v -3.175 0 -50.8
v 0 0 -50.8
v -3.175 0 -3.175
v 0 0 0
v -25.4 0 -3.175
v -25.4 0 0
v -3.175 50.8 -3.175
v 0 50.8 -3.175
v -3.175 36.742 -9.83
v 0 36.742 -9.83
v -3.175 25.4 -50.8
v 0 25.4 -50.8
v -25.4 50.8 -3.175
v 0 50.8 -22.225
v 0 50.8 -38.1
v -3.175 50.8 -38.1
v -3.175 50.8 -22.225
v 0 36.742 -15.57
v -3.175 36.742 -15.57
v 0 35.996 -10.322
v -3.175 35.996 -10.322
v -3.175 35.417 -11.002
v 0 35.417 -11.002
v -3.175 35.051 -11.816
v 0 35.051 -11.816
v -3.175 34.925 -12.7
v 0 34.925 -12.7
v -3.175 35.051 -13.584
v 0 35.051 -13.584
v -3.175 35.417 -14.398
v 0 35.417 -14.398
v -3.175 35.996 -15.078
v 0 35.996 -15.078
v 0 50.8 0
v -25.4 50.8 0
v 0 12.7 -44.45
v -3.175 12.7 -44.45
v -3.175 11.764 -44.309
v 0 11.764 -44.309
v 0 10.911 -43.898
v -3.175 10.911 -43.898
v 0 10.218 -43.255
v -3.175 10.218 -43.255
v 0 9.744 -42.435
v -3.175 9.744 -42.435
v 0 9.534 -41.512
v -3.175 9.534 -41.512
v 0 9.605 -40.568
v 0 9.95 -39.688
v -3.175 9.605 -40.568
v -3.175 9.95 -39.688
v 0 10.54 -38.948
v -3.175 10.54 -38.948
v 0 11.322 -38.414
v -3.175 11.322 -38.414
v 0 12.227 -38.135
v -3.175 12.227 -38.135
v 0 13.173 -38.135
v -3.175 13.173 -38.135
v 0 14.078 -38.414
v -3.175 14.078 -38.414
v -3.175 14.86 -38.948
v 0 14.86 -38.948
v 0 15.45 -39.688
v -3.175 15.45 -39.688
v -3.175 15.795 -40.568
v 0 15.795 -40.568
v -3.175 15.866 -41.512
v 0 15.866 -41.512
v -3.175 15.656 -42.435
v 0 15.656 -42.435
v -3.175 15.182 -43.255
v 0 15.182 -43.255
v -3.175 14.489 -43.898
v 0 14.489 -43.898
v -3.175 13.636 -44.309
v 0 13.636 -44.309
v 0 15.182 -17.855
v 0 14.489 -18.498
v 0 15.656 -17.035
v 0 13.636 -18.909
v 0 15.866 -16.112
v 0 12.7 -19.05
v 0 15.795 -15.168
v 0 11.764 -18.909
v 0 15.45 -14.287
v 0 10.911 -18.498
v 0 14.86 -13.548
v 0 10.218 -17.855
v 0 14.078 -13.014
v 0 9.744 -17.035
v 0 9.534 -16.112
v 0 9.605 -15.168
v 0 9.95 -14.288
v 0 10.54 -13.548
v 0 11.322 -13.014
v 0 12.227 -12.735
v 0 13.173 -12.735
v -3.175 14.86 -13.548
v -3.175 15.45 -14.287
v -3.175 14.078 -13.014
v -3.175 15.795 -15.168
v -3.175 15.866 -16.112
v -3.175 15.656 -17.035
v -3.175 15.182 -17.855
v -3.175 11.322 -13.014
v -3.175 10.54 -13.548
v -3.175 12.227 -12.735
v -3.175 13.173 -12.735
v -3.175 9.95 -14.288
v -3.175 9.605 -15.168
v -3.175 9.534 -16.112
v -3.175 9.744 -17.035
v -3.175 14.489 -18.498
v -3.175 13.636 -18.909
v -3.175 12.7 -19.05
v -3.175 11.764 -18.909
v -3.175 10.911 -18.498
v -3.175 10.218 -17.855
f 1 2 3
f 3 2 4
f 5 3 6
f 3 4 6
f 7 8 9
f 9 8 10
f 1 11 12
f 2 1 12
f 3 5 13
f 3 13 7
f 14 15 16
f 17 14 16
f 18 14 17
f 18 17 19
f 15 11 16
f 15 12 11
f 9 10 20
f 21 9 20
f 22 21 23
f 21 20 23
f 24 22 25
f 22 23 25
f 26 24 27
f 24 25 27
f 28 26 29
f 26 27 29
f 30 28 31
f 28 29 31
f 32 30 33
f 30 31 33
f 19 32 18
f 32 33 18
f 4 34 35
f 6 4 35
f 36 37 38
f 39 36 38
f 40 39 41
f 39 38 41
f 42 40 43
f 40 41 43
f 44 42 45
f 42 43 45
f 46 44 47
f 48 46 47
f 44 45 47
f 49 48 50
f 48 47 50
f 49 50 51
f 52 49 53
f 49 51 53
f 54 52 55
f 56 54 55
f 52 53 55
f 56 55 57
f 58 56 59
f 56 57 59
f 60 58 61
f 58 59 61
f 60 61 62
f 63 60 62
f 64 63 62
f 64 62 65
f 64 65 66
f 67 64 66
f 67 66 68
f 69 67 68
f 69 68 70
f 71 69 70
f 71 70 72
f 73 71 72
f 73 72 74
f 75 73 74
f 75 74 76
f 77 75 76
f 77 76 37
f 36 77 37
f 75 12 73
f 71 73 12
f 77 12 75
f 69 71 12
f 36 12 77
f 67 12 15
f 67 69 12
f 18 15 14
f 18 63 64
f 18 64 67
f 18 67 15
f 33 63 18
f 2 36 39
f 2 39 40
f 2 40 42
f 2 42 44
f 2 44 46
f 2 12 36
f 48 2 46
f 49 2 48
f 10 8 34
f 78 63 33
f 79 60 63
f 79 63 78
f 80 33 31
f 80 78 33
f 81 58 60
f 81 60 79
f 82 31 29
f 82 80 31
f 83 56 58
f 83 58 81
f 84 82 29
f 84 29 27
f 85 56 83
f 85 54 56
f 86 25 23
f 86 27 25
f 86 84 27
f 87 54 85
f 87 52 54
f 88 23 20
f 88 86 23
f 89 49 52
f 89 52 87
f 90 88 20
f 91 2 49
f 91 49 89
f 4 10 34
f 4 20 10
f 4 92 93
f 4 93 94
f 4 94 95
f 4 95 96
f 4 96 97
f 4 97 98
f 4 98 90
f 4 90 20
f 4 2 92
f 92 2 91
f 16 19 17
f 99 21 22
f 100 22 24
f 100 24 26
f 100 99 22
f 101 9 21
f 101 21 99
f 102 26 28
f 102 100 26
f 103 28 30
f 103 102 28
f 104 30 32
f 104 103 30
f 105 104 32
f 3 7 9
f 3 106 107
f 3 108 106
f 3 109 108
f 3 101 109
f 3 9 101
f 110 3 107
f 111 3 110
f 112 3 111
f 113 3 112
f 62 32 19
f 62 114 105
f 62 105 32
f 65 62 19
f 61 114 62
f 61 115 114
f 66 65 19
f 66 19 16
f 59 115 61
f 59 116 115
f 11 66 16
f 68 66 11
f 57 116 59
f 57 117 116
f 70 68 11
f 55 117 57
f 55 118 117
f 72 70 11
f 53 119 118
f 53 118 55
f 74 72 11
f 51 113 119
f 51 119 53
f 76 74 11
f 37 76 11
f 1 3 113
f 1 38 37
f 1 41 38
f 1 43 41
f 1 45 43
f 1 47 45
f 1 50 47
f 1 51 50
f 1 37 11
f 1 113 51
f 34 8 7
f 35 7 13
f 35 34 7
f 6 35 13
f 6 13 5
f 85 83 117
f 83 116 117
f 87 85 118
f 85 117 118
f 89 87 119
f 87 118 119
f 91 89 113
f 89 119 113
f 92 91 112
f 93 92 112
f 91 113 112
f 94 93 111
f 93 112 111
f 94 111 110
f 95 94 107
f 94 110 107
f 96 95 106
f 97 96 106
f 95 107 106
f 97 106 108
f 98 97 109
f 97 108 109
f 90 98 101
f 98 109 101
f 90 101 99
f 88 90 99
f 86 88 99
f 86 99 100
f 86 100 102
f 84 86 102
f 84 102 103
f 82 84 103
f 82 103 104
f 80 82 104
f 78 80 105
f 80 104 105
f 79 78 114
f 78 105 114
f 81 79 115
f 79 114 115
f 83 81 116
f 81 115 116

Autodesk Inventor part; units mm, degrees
ref_plane "YZ Plane" through (0, 0, 0) normal (1, 0, 0) x (0, 1, 0)
ref_plane "XZ Plane" through (0, 0, 0) normal (0, 1, 0) x (-1, 0, 0)
ref_plane "XY Plane" through (0, 0, 0) normal (0, 0, 1) x (1, 0, 0)
sketch "Sketch1" plane through (0, 0, 0) normal (0, 1, 0) x (-1, 0, 0)
  line L0 (0, 0) -> (50.8, 0)
  line L1 (50.8, 0) -> (50.8, -3.175)
  line L2 (50.8, -3.175) -> (0, -3.175)
  line L3 (0, -3.175) -> (0, 0)
  line L4 (0, 0) -> (3.175, 0)
  line L5 (3.175, 0) -> (3.175, -50.8)
  line L6 (3.175, -50.8) -> (0, -50.8)
  line L7 (0, -50.8) -> (0, 0)
  dimension "d0" = 50.8
  dimension "d1" = 3.175
  dimension "d2" = 3.175
  dimension "d3" = 50.8
extrude "Extrusion1" add sketch "Sketch1" along normal blind 50.8
sketch "Sketch2" plane through (-50.8, 0, 0) normal (0, 0, 1) x (1, 0, 0)
  line L0 (0, 50.8) -> (25.4, 50.8)
  line L1 (25.4, 50.8) -> (25.4, 0)
  line L2 (25.4, 0) -> (0, 0)
  line L3 (0, 0) -> (0, 50.8)
  point P0 (50.8, 0)
  dimension "d6" = 25.4
  dimension "d7" = 50.8
extrude "Extrusion2" cut sketch "Sketch2" against normal blind 50.8
sketch "Sketch3" plane through (0, 0, 0) normal (1, 0, 0) x (0, 0, -1)
  line L0 (0, 50.8) -> (50.8, 50.8) projected
  line L1 (0, 0) -> (0, 50.8) projected
  line L2 (0, 0) -> (50.8, 0) projected
  line L3 (50.8, 0) -> (50.8, 50.8) projected
  line L4 (3.175, 0) -> (3.175, 50.8) projected
  line L5 (0, 0) -> (3.175, 0) projected
  line L6 (0, 50.8) -> (0, 0) projected
  line L7 (3.175, 50.8) -> (0, 50.8) projected
  circle A0 centre (12.7, 38.1) radius 3.175 construction
  line L8 (3.175, 50.8) -> (9.8303, 36.7415) construction
  line L9 (0, 50.8) -> (50.8, 50.8) construction
  line L10 (22.225, 50.8) -> (15.5697, 36.7415) construction
  line L11 (3.175, 50.8) -> (9.8303, 36.7415)
  line L12 (22.225, 50.8) -> (15.5697, 36.7415)
  arc A1 (9.8303, 36.7415) -> (15.5697, 36.7415) centre (12.7, 38.1) ccw
  line L13 (3.175, 50.8) -> (22.225, 50.8)
  dimension "d10" = 6.35
  dimension "d11" = 19.05
  dimension "d12" = 9.525
  dimension "d13" = 12.7
extrude "Extrusion3" cut sketch "Sketch3" against normal blind 50.8 contours L0 L12 A1 L11
sketch "Sketch4" plane through (0, 0, 0) normal (1, 0, 0) x (0, 0, -1)
  line L0 (50.8, 50.8) -> (38.1, 50.8)
  line L1 (22.225, 50.8) -> (50.8, 50.8) projected
  line L2 (50.8, 50.8) -> (50.8, 25.4)
  line L3 (50.8, 0) -> (50.8, 50.8) projected
  line L4 (50.8, 25.4) -> (38.1, 50.8)
  point P0 (0, 0)
  dimension "d16" = 12.7
  dimension "d17" = 25.4
extrude "Extrusion4" cut sketch "Sketch4" against normal blind 50.8
sketch "Sketch5" plane through (0, 0, 0) normal (1, 0, 0) x (0, 0, -1)
  line L0 (0, 0) -> (0, 50.8) projected
  line L1 (0, 0) -> (50.8, 0) projected
  line L2 (50.8, 0) -> (50.8, 25.4) projected
  point P0 (15.875, 12.7)
  point P1 (41.275, 12.7)
  dimension "d20" = 15.875
  dimension "d21" = 12.7
  dimension "d22" = 12.7
  dimension "d23" = 9.525
hole "Hole1" at (0, 12.7, -15.875) at (0, 12.7, -41.275) direction (-1, 0, 0) diameter 6.35 end through all
properties part number "front tab 2x2" material "Aluminum 6061"
